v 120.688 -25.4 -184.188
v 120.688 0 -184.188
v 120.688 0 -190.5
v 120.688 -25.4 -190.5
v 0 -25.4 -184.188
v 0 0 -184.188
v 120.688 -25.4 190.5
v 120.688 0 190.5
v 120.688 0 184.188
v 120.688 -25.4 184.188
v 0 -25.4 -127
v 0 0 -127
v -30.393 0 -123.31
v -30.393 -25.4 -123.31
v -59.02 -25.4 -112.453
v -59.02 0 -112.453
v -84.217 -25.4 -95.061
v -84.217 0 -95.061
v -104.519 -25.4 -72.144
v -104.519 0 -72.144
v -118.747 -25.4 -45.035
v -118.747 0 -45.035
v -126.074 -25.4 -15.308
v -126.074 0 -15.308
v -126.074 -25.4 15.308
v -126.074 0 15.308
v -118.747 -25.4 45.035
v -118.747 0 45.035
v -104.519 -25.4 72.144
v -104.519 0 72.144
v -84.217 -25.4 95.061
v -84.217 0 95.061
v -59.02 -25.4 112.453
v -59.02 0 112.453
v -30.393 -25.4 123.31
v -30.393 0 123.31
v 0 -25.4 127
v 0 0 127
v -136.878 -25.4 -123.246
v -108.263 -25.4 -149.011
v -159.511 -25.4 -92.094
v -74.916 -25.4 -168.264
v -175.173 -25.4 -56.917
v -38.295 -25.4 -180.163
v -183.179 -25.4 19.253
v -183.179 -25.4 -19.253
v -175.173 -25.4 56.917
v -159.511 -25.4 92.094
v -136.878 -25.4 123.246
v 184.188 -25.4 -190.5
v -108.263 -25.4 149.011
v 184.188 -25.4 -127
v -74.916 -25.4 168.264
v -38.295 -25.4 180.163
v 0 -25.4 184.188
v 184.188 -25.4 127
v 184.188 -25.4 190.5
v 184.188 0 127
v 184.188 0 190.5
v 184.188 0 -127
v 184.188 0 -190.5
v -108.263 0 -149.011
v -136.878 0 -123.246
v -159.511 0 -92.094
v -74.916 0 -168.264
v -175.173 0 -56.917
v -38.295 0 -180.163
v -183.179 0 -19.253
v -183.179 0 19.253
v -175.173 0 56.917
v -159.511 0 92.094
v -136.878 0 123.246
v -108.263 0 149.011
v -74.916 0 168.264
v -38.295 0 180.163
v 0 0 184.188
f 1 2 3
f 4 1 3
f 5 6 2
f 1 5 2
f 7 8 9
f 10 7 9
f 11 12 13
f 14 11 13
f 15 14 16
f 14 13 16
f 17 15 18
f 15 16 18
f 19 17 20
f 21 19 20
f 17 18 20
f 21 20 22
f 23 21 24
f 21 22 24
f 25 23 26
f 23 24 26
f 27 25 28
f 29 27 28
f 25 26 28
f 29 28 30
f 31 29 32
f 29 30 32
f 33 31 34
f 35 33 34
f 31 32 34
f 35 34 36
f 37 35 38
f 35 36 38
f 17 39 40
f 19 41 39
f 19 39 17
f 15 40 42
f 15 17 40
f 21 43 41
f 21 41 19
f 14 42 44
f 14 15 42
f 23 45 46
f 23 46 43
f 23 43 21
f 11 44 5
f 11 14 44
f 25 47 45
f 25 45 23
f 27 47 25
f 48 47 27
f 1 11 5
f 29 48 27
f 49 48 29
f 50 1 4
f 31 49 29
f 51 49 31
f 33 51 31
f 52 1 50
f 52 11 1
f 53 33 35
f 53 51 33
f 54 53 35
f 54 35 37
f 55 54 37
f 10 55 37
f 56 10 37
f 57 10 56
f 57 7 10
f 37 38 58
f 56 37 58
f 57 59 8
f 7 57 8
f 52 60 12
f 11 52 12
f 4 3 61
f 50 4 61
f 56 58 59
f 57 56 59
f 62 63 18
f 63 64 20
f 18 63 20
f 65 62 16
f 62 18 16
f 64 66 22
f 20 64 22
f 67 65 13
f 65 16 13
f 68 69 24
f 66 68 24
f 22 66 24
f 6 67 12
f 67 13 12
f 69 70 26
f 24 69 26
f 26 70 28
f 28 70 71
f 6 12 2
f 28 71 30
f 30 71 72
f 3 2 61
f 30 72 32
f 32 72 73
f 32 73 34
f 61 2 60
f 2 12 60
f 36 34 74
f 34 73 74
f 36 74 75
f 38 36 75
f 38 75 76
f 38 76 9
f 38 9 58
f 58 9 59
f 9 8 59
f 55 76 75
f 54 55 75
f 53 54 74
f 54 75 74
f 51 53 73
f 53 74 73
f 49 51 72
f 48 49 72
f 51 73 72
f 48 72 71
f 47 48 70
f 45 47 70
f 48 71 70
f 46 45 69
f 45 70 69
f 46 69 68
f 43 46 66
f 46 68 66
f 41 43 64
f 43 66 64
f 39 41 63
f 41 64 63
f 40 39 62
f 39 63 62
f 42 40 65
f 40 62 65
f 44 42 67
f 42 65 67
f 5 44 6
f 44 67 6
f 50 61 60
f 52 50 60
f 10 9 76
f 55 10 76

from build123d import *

# Parameters (mm, degrees)
F1_DEPTH = 25.4


with BuildPart() as f1:
    # F0 (on Front) → F1 (new body)
    with BuildSketch(Plane.XZ):
        with BuildLine():
            Line((120.687595, 184.187595), (0, 184.187595))
            ThreePointArc((0, 184.187595), (-184.187595, 0), (0, -184.187595))
            Line((0, -184.187595), (120.687595, -184.187595))
            Line((120.687595, -184.187595), (120.687595, -190.5))
            Line((120.687595, -190.5), (184.187595, -190.5))
            Line((184.187595, -190.5), (184.187595, -184.187595))
            Line((184.187595, -184.187595), (184.187595, -127))
            Line((184.187595, -127), (120.687595, -127))
            Line((120.687595, -127), (0, -127))
            ThreePointArc((0, -127), (-127, 0), (0, 127))
            Line((0, 127), (120.687595, 127))
            Line((120.687595, 127), (184.187595, 127))
            Line((184.187595, 127), (184.187595, 184.187595))
            Line((184.187595, 184.187595), (184.187595, 190.5))
            Line((184.187595, 190.5), (120.687595, 190.5))
            Line((120.687595, 190.5), (120.687595, 184.187595))
        make_face()
    extrude(amount=F1_DEPTH)


solid = f1.part
